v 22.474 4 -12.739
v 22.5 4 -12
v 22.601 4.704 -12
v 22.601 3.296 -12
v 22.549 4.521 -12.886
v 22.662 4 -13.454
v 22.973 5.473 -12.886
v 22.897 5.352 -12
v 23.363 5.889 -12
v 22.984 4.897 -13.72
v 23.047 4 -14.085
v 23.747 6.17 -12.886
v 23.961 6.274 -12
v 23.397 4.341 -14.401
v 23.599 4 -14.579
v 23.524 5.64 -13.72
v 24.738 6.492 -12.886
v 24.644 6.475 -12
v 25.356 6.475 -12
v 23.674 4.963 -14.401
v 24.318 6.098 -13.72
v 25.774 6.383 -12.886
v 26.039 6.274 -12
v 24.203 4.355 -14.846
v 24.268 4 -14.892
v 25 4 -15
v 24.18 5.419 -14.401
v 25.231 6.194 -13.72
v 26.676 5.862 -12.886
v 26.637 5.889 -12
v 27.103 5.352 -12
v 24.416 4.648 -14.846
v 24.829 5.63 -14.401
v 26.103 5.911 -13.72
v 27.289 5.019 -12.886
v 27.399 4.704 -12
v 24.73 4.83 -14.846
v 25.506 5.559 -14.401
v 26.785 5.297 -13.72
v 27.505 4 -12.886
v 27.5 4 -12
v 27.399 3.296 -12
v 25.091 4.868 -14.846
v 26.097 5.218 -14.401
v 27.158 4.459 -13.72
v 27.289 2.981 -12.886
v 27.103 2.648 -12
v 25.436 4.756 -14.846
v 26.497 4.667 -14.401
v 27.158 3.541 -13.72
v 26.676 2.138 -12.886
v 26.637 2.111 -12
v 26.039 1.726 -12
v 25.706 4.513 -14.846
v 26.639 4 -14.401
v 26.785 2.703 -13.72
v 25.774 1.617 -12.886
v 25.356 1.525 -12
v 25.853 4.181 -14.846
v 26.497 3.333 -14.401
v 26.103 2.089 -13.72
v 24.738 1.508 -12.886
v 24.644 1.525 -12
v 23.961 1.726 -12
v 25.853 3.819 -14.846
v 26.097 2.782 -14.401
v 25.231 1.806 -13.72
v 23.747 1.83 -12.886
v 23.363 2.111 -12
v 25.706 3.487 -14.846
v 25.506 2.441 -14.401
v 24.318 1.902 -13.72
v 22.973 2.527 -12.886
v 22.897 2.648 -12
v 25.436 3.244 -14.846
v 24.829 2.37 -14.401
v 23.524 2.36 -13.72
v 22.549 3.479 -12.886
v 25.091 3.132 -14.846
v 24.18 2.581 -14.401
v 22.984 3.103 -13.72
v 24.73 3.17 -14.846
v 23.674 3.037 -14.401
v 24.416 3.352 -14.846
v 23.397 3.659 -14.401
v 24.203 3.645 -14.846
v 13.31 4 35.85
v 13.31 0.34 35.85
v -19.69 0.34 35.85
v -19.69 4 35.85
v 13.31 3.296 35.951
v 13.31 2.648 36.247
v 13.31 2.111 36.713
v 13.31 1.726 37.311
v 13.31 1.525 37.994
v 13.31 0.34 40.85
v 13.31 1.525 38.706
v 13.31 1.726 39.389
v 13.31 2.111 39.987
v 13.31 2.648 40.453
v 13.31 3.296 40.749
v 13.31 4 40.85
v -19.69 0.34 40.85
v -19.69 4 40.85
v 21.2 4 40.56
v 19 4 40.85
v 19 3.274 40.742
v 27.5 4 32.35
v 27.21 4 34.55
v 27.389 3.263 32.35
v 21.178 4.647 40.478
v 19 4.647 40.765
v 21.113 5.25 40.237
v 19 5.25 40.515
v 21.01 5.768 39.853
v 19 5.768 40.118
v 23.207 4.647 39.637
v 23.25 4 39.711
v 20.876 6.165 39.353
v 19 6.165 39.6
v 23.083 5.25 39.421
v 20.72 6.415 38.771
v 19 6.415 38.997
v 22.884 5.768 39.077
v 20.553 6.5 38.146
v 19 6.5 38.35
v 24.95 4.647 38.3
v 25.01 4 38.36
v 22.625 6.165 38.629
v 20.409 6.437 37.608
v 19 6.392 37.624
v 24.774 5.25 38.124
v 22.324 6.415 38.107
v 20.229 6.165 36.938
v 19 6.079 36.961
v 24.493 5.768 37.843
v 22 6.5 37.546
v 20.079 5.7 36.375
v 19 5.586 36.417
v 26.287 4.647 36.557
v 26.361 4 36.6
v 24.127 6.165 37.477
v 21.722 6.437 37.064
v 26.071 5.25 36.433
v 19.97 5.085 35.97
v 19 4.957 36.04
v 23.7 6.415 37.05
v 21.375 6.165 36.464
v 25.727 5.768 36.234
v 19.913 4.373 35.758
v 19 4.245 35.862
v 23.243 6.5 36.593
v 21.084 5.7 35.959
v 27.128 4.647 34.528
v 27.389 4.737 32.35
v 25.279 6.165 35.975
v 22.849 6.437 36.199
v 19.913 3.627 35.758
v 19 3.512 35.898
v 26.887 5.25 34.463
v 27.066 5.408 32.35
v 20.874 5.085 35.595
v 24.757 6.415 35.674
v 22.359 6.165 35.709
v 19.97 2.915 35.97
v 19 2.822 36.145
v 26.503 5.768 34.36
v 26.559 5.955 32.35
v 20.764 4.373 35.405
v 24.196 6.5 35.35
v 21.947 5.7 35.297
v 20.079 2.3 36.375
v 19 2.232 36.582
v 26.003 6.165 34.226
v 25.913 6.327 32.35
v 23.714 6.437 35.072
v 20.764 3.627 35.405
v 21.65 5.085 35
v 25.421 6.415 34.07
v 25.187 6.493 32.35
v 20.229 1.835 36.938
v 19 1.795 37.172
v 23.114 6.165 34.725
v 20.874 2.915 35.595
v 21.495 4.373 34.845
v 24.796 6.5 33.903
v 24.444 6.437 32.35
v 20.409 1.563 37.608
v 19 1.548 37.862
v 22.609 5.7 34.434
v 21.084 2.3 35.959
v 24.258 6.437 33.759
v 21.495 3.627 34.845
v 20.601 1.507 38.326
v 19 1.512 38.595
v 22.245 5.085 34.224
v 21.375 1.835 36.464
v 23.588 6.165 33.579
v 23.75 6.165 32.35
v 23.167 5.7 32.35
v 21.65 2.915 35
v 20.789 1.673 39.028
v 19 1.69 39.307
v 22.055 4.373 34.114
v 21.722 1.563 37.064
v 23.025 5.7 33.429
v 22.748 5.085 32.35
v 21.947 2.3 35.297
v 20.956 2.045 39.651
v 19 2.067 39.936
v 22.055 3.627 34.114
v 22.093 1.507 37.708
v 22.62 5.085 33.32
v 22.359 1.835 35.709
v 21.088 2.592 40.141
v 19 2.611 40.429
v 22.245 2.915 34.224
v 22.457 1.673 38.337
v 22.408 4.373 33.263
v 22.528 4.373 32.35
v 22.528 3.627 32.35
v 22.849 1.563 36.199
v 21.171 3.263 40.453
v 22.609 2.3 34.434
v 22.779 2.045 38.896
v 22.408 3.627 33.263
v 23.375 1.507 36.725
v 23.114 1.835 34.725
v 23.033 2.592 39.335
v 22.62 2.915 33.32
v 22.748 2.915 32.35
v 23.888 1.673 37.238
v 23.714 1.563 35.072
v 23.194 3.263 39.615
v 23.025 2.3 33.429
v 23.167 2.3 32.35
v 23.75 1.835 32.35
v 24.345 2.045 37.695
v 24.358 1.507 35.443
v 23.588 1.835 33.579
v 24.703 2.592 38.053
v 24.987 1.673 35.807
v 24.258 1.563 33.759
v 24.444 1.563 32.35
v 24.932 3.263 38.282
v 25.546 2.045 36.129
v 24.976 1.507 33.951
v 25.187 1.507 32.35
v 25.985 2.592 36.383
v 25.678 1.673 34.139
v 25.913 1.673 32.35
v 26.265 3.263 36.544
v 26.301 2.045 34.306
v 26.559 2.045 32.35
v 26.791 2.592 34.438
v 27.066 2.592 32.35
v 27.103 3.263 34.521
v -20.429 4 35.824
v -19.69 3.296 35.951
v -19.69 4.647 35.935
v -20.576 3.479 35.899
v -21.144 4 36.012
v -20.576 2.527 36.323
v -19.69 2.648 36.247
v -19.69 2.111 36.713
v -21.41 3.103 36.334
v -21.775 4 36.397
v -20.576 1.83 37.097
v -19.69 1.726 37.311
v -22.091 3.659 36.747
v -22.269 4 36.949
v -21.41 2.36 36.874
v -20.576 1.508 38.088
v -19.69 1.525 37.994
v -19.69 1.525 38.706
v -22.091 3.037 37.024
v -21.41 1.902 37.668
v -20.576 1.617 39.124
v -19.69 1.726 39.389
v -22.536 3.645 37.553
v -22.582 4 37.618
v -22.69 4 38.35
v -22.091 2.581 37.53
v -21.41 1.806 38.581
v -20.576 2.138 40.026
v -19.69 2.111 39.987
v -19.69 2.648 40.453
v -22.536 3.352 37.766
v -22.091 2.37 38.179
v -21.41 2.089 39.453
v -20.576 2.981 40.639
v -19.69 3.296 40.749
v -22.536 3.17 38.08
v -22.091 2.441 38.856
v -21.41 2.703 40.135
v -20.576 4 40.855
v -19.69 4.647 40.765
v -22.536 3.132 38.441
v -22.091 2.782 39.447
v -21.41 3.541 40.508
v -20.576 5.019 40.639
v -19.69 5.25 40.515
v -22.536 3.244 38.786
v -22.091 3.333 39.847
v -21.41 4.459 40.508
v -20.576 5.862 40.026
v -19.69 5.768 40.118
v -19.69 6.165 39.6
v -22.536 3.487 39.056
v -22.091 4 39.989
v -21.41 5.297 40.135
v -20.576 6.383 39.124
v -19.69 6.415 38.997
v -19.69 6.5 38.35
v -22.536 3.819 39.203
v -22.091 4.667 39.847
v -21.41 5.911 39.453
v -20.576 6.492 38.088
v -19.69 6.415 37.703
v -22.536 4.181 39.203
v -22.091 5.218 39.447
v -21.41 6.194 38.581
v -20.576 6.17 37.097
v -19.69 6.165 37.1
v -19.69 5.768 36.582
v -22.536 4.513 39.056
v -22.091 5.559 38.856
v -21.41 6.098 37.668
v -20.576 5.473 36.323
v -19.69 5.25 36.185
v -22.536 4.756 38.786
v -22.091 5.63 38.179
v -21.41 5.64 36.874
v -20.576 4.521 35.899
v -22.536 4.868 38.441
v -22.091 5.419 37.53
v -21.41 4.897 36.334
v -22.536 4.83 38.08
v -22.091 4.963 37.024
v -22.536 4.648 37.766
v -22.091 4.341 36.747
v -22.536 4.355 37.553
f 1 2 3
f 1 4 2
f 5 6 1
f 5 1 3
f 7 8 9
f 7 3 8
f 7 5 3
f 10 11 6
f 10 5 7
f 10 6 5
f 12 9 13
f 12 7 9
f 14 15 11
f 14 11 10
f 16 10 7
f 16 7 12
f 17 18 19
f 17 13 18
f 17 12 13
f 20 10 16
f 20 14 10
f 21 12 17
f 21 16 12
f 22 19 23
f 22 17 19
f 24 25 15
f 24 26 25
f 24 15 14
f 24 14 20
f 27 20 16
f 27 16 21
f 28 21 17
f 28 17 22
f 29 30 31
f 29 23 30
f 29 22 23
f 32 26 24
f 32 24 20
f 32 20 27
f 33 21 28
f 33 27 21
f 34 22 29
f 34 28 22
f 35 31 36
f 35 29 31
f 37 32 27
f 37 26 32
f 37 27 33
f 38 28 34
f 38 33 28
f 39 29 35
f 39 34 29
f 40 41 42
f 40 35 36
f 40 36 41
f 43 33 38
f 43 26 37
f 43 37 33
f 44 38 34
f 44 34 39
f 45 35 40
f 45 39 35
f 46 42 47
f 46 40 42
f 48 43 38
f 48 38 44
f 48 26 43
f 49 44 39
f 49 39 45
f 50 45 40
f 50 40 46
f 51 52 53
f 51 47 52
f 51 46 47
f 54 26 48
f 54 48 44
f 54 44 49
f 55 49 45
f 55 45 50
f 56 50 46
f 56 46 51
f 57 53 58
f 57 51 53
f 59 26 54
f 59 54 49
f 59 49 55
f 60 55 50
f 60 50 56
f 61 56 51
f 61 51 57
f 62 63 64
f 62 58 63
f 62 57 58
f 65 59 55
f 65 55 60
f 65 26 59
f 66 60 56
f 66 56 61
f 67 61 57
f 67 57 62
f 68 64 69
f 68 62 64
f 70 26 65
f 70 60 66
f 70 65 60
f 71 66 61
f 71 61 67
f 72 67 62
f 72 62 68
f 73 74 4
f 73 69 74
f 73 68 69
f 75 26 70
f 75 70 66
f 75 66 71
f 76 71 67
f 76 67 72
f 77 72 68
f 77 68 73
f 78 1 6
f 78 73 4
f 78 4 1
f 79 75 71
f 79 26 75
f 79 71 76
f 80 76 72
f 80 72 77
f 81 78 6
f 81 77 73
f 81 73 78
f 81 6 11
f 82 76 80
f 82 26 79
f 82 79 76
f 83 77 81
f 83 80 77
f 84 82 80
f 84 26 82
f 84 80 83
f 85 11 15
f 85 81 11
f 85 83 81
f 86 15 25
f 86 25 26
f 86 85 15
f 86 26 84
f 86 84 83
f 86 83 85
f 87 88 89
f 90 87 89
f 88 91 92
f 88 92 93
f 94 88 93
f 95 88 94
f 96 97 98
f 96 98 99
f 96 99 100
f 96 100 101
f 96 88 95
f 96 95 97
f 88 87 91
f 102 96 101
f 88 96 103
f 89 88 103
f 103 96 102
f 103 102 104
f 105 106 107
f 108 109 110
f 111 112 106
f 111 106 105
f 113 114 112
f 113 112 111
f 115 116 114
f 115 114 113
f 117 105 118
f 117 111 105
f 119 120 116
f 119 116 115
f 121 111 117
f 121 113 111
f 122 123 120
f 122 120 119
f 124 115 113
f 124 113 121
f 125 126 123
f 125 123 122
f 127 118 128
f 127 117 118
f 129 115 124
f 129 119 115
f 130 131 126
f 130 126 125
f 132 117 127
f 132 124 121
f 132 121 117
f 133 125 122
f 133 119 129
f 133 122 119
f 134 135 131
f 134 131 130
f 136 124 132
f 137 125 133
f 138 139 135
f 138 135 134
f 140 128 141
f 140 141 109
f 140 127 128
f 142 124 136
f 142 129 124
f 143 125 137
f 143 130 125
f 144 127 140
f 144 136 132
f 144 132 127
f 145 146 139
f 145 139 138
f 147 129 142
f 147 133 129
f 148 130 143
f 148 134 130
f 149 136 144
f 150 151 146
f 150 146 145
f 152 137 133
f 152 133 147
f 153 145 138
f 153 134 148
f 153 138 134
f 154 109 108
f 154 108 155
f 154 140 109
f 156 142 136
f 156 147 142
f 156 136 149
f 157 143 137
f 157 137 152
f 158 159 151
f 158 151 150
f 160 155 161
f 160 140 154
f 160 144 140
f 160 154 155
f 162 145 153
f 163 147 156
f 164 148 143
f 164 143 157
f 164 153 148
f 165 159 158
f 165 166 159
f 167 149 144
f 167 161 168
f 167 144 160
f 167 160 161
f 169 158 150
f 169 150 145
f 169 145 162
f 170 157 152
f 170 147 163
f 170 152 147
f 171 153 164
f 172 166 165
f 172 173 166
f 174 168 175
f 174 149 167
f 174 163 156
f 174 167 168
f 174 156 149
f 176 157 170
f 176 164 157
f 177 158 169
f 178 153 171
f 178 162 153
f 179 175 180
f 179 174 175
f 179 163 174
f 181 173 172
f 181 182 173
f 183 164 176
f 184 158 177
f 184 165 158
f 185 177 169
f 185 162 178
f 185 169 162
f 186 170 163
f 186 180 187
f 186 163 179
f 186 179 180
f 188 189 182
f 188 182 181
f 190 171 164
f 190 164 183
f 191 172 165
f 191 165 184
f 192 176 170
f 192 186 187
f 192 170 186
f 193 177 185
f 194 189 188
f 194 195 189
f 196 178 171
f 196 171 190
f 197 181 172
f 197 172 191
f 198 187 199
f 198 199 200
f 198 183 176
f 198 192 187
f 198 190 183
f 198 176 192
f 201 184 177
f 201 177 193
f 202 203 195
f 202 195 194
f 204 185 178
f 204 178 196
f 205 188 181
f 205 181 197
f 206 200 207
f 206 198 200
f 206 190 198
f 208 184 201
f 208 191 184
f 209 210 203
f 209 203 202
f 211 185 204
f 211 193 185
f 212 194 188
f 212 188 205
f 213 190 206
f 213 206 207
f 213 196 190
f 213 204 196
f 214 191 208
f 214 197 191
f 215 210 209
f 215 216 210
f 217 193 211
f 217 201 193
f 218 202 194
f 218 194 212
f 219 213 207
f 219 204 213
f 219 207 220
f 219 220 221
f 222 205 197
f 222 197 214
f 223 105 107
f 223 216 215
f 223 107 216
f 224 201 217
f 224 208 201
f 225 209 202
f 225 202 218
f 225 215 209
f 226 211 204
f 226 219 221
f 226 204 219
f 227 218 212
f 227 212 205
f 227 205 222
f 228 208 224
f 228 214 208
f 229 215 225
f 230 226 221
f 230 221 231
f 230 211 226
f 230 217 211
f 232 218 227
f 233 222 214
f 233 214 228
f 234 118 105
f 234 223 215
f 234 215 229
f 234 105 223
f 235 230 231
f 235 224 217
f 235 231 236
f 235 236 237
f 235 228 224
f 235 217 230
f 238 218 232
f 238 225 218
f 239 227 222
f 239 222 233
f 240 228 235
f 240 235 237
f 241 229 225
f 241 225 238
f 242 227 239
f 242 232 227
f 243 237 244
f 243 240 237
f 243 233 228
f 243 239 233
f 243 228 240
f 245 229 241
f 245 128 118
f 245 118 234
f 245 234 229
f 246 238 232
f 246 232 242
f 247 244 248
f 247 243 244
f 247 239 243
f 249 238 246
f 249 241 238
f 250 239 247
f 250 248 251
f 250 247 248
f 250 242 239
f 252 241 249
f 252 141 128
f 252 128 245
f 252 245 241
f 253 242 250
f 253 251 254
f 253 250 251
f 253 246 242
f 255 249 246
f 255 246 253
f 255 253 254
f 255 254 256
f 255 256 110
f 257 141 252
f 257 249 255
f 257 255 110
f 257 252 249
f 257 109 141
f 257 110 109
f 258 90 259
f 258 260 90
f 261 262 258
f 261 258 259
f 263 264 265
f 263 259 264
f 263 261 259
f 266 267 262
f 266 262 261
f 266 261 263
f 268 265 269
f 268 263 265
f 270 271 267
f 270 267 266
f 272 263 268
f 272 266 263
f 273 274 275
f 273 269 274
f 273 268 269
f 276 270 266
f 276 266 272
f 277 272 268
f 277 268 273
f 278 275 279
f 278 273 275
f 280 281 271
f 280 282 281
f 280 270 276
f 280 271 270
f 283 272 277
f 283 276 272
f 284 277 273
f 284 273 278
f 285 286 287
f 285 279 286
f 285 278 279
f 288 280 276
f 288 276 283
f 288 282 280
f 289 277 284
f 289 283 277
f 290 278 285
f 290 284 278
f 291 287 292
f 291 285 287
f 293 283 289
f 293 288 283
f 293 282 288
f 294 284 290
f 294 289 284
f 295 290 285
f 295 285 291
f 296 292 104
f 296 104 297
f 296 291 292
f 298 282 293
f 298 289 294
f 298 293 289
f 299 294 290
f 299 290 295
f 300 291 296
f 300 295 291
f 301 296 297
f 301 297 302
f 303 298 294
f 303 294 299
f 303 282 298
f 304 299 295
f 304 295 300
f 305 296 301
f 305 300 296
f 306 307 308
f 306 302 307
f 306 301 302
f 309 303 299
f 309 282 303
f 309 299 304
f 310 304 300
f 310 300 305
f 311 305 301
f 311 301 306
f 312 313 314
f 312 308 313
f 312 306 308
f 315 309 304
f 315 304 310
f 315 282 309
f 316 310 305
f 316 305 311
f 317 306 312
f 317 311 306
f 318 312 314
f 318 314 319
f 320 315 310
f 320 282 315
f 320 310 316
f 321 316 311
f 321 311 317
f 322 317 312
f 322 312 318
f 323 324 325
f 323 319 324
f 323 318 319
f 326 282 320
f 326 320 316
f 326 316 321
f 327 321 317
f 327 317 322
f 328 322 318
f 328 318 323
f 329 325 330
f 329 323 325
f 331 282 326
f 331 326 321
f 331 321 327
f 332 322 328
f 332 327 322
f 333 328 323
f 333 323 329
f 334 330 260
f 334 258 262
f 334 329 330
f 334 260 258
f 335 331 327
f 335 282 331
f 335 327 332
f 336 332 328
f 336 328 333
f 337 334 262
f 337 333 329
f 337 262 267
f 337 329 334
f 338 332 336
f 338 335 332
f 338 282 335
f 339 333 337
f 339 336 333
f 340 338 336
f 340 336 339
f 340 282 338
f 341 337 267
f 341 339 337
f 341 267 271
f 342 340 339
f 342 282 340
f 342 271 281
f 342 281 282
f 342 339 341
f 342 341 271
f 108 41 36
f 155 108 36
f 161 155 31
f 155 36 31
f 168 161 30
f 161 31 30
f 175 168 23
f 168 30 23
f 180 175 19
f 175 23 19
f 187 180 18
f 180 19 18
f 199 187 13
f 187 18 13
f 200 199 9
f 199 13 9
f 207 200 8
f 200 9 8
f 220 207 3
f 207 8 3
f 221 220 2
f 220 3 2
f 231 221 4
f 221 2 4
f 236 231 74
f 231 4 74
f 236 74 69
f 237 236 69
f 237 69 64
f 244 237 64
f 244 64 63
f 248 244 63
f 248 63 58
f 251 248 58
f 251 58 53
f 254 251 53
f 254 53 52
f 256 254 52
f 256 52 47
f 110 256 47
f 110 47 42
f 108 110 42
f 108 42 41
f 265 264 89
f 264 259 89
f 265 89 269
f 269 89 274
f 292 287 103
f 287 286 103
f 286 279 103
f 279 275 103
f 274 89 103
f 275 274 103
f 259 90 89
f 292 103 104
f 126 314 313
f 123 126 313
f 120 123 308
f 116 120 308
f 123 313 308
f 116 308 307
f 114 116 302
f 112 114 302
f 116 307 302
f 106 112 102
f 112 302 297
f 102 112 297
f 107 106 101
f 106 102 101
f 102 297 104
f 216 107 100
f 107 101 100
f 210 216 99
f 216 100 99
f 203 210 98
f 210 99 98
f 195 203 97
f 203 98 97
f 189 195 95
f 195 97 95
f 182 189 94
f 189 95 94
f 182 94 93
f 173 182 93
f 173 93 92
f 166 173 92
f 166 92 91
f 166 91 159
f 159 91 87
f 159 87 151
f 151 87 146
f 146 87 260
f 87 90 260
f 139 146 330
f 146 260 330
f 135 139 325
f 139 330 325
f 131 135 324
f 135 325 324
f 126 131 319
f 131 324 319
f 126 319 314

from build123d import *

# Parameters (mm, degrees)
SWEEP1_START        = -19.69
SWEEP1_OUTLINE_R    = 2.5
SWEEP1_DEPTH        = 38.69
SWEEP1_START_2      = -12
SWEEP1_2_OUTLINE_R  = 2.5
SWEEP1_2_DEPTH      = 44.35
SWEEP1_3_OUTLINE_R  = 2.5
SWEEP1_3_ANGLE      = 90
DOME1_FACE_RADIUS   = 2.5
DOME1_HEIGHT        = 3
DOME2_FACE_RADIUS   = 2.5
DOME2_HEIGHT        = 3
EXTRUDE1_REACH      = 51.69
EXTRUDE1_END_RADIUS = 2.5
SKETCH3_W           = 33
SKETCH3_H           = 5


with BuildPart() as part:
    # Sweep1: read off the stored shape, not the designer's step
    # Sweep1 outline → Sweep1 (new body)
    with BuildSketch(Plane.YZ.offset(SWEEP1_START)):
        with Locations((4, 38.35)):
            Circle(SWEEP1_OUTLINE_R)
    extrude(amount=SWEEP1_DEPTH)



with BuildPart() as body_2:
    # Sweep1 2 outline → Sweep1 2 (new body)
    with BuildSketch(Plane.XY.offset(SWEEP1_START_2)):
        with Locations((25, 4)):
            Circle(SWEEP1_2_OUTLINE_R)
    extrude(amount=SWEEP1_2_DEPTH)


with BuildPart() as part_1:
    add(part.part)

    add(body_2.part)  # Sweep1 3 merges body 2
    # Sweep1 3 outline → Sweep1 3 (revolve)
    with BuildSketch(Plane(origin=(19, 0, 32.35), x_dir=(0, 0, 1), z_dir=(-1, 0, 0))):
        with Locations((6, 4)):
            Circle(SWEEP1_3_OUTLINE_R)
    revolve(axis=Axis((19, 0, 32.35), (0, 1, 0)), revolution_arc=SWEEP1_3_ANGLE)

    # Dome1: a dome of height H over a round flat face of radius A is a cap of a sphere of radius (A * A + H * H) / (2 * H)
    dome1_r = (DOME1_FACE_RADIUS * DOME1_FACE_RADIUS + DOME1_HEIGHT * DOME1_HEIGHT) / (2 * DOME1_HEIGHT)
    dome1_base = Plane((-19.69, 4, 38.35), z_dir=(-1, 0, 0))
    with Locations(dome1_base.offset(DOME1_HEIGHT - dome1_r)):
        dome1_ball = Sphere(dome1_r, mode=Mode.PRIVATE)
    add(split(dome1_ball, bisect_by=dome1_base, keep=Keep.TOP, mode=Mode.PRIVATE))

    # Dome2: a dome of height H over a round flat face of radius A is a cap of a sphere of radius (A * A + H * H) / (2 * H)
    dome2_r = (DOME2_FACE_RADIUS * DOME2_FACE_RADIUS + DOME2_HEIGHT * DOME2_HEIGHT) / (2 * DOME2_HEIGHT)
    dome2_base = Plane((25, 4, -12), z_dir=(0, 0, -1))
    with Locations(dome2_base.offset(DOME2_HEIGHT - dome2_r)):
        dome2_ball = Sphere(dome2_r, mode=Mode.PRIVATE)
    add(split(dome2_ball, bisect_by=dome2_base, keep=Keep.TOP, mode=Mode.PRIVATE))

    # Extrude1: up to this cylinder (the profile starts outside it)
    extrude1_end = Plane(origin=(-3.19, 4, 38.35), z_dir=(-1, 0, 0)) * Cylinder(EXTRUDE1_END_RADIUS, 109.38, mode=Mode.PRIVATE)
    # Sketch3 → Extrude1 (add, up to the surface)
    with BuildSketch(Plane(origin=(0, 0.34, 0), x_dir=(-1, 0, 0), z_dir=(0, 1, 0)), mode=Mode.PRIVATE) as extrude1_sk1:
        with Locations((3.19, 38.35)):
            Rectangle(SKETCH3_W, SKETCH3_H)
    extrude1_tool1 = extrude(extrude1_sk1.sketch, amount=EXTRUDE1_REACH, mode=Mode.PRIVATE) - extrude1_end
    add(extrude1_tool1.solids().sort_by_distance((-3.19, 0.34, 38.35))[0])


solid = part_1.part
